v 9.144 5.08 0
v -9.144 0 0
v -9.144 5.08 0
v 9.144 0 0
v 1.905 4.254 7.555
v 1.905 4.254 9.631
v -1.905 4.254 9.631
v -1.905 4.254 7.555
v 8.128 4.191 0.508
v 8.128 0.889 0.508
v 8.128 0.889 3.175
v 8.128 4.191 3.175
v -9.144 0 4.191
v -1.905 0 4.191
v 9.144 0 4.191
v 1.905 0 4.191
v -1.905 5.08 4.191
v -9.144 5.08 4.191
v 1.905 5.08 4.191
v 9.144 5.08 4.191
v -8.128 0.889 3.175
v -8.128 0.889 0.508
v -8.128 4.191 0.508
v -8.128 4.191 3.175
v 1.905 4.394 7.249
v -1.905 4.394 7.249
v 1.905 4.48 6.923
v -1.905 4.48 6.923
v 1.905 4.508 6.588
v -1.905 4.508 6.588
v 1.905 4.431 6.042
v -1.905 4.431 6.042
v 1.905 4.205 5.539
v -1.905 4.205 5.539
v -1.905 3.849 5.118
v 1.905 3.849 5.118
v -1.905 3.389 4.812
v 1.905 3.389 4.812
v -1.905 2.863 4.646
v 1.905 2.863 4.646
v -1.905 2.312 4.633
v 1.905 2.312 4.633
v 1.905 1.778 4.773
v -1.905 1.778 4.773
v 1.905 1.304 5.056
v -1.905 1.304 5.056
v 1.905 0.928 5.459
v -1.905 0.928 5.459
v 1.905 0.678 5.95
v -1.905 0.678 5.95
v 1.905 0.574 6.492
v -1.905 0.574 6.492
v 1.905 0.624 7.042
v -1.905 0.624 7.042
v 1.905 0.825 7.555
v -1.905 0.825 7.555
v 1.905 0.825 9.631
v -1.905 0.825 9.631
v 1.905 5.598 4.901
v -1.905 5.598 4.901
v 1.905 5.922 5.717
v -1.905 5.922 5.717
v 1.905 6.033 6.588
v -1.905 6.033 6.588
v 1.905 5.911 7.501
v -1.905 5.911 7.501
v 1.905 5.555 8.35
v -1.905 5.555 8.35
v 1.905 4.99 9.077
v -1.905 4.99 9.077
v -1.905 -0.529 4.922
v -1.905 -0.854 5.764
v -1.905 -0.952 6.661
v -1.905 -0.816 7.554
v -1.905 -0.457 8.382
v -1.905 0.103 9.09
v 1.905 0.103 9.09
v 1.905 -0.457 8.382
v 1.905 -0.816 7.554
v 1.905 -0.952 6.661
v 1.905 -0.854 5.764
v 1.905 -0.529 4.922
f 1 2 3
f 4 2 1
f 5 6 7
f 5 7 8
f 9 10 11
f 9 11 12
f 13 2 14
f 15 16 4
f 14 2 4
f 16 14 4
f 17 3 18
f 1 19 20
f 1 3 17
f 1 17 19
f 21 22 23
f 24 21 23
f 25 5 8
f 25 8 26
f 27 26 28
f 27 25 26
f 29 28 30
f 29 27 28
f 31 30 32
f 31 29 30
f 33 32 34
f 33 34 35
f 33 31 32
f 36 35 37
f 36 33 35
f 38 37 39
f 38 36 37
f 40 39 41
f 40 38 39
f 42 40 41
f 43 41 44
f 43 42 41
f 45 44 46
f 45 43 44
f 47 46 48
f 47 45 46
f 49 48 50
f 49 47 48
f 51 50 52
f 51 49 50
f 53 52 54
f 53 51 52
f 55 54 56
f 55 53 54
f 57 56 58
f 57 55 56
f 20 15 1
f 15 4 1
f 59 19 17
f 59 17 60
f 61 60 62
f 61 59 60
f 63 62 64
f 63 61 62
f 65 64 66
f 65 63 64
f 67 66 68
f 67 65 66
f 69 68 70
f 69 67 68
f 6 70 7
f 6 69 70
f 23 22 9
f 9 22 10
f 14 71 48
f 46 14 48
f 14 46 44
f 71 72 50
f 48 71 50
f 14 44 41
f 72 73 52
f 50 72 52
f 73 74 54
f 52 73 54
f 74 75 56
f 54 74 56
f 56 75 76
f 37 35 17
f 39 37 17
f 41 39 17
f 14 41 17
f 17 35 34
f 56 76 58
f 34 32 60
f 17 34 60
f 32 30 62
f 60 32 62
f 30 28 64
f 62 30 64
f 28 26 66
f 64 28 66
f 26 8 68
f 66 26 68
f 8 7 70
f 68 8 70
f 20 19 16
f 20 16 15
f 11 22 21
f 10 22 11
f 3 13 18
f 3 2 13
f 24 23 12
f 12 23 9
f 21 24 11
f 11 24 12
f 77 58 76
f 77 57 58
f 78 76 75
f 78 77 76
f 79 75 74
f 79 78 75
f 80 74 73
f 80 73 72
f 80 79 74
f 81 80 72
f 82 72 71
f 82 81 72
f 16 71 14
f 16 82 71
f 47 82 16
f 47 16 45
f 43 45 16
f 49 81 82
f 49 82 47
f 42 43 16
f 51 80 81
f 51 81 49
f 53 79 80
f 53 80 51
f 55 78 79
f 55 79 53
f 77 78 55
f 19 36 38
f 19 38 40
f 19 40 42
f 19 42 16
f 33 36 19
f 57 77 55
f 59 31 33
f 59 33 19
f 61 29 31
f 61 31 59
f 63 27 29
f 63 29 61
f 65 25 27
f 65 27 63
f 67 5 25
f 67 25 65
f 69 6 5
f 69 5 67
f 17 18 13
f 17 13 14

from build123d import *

# Parameters (mm, degrees)
F0_W     = 18.288
F0_H     = 5.08
F0_W_2   = 16.256
F0_H_2   = 3.302
F1_DEPTH = 3.175
F2_W     = 16.256
F2_H     = 3.302
F3_DEPTH = 0.508
F4_W     = 18.288
F4_H     = 5.08
F4_W_2   = 16.256
F4_H_2   = 3.302
F5_DEPTH = 1.016
F7_DEPTH = 1.905


with BuildPart() as f1:
    # F0 (on Top) → F1 (new body)
    with BuildSketch(Plane.XY):
        with Locations((0, 2.54)):
            Rectangle(F0_W, F0_H)
        with Locations((0, 2.54)):
            Rectangle(F0_W_2, F0_H_2, mode=Mode.SUBTRACT)
    extrude(amount=F1_DEPTH)

    # F2 (on face) → F3 (join)
    with BuildSketch(Plane(origin=(0, 0, 0), x_dir=(1, 0, 0), z_dir=(0, 0, -1))):
        with Locations((0, -2.54)):
            Rectangle(F2_W, F2_H)
    extrude(amount=-F3_DEPTH)

    # F4 (on face) → F5 (join)
    with BuildSketch(Plane.XY.offset(3.175)):
        with Locations((0, 2.54)):
            Rectangle(F4_W, F4_H)
        with Locations((0, 2.54)):
            Rectangle(F4_W_2, F4_H_2, mode=Mode.SUBTRACT)
        with Locations((0, 2.54)):
            Rectangle(F4_W_2, F4_H_2)
    extrude(amount=F5_DEPTH)

    # F6 (on Right) → F7 (join, symmetric)
    with BuildSketch(Plane.YZ):
        with BuildLine():
            Line((0, 4.191), (5.08, 4.191))
            ThreePointArc((5.08, 4.191), (5.7856514177, 5.2983813365), (6.0325, 6.5880724332))
            ThreePointArc((6.0325, 6.5880724332), (5.5554143579, 8.3501259227), (4.2545, 9.6307761651))
            Line((4.2545, 9.6307761651), (4.2545, 7.5552756176))
            ThreePointArc((4.2545, 7.5552756176), (4.4439413725, 7.0880719332), (4.5085, 6.5880724332))
            ThreePointArc((4.5085, 6.5880724332), (2.0400005, 4.6841310607), (0.8255, 7.5552756176))
            Line((0.8255, 7.5552756176), (0.8255, 9.6307761651))
            ThreePointArc((0.8255, 9.6307761651), (-0.9129673824, 7.1120690992), (0, 4.191))
        make_face()
    extrude(amount=F7_DEPTH, both=True)


solid = f1.part
